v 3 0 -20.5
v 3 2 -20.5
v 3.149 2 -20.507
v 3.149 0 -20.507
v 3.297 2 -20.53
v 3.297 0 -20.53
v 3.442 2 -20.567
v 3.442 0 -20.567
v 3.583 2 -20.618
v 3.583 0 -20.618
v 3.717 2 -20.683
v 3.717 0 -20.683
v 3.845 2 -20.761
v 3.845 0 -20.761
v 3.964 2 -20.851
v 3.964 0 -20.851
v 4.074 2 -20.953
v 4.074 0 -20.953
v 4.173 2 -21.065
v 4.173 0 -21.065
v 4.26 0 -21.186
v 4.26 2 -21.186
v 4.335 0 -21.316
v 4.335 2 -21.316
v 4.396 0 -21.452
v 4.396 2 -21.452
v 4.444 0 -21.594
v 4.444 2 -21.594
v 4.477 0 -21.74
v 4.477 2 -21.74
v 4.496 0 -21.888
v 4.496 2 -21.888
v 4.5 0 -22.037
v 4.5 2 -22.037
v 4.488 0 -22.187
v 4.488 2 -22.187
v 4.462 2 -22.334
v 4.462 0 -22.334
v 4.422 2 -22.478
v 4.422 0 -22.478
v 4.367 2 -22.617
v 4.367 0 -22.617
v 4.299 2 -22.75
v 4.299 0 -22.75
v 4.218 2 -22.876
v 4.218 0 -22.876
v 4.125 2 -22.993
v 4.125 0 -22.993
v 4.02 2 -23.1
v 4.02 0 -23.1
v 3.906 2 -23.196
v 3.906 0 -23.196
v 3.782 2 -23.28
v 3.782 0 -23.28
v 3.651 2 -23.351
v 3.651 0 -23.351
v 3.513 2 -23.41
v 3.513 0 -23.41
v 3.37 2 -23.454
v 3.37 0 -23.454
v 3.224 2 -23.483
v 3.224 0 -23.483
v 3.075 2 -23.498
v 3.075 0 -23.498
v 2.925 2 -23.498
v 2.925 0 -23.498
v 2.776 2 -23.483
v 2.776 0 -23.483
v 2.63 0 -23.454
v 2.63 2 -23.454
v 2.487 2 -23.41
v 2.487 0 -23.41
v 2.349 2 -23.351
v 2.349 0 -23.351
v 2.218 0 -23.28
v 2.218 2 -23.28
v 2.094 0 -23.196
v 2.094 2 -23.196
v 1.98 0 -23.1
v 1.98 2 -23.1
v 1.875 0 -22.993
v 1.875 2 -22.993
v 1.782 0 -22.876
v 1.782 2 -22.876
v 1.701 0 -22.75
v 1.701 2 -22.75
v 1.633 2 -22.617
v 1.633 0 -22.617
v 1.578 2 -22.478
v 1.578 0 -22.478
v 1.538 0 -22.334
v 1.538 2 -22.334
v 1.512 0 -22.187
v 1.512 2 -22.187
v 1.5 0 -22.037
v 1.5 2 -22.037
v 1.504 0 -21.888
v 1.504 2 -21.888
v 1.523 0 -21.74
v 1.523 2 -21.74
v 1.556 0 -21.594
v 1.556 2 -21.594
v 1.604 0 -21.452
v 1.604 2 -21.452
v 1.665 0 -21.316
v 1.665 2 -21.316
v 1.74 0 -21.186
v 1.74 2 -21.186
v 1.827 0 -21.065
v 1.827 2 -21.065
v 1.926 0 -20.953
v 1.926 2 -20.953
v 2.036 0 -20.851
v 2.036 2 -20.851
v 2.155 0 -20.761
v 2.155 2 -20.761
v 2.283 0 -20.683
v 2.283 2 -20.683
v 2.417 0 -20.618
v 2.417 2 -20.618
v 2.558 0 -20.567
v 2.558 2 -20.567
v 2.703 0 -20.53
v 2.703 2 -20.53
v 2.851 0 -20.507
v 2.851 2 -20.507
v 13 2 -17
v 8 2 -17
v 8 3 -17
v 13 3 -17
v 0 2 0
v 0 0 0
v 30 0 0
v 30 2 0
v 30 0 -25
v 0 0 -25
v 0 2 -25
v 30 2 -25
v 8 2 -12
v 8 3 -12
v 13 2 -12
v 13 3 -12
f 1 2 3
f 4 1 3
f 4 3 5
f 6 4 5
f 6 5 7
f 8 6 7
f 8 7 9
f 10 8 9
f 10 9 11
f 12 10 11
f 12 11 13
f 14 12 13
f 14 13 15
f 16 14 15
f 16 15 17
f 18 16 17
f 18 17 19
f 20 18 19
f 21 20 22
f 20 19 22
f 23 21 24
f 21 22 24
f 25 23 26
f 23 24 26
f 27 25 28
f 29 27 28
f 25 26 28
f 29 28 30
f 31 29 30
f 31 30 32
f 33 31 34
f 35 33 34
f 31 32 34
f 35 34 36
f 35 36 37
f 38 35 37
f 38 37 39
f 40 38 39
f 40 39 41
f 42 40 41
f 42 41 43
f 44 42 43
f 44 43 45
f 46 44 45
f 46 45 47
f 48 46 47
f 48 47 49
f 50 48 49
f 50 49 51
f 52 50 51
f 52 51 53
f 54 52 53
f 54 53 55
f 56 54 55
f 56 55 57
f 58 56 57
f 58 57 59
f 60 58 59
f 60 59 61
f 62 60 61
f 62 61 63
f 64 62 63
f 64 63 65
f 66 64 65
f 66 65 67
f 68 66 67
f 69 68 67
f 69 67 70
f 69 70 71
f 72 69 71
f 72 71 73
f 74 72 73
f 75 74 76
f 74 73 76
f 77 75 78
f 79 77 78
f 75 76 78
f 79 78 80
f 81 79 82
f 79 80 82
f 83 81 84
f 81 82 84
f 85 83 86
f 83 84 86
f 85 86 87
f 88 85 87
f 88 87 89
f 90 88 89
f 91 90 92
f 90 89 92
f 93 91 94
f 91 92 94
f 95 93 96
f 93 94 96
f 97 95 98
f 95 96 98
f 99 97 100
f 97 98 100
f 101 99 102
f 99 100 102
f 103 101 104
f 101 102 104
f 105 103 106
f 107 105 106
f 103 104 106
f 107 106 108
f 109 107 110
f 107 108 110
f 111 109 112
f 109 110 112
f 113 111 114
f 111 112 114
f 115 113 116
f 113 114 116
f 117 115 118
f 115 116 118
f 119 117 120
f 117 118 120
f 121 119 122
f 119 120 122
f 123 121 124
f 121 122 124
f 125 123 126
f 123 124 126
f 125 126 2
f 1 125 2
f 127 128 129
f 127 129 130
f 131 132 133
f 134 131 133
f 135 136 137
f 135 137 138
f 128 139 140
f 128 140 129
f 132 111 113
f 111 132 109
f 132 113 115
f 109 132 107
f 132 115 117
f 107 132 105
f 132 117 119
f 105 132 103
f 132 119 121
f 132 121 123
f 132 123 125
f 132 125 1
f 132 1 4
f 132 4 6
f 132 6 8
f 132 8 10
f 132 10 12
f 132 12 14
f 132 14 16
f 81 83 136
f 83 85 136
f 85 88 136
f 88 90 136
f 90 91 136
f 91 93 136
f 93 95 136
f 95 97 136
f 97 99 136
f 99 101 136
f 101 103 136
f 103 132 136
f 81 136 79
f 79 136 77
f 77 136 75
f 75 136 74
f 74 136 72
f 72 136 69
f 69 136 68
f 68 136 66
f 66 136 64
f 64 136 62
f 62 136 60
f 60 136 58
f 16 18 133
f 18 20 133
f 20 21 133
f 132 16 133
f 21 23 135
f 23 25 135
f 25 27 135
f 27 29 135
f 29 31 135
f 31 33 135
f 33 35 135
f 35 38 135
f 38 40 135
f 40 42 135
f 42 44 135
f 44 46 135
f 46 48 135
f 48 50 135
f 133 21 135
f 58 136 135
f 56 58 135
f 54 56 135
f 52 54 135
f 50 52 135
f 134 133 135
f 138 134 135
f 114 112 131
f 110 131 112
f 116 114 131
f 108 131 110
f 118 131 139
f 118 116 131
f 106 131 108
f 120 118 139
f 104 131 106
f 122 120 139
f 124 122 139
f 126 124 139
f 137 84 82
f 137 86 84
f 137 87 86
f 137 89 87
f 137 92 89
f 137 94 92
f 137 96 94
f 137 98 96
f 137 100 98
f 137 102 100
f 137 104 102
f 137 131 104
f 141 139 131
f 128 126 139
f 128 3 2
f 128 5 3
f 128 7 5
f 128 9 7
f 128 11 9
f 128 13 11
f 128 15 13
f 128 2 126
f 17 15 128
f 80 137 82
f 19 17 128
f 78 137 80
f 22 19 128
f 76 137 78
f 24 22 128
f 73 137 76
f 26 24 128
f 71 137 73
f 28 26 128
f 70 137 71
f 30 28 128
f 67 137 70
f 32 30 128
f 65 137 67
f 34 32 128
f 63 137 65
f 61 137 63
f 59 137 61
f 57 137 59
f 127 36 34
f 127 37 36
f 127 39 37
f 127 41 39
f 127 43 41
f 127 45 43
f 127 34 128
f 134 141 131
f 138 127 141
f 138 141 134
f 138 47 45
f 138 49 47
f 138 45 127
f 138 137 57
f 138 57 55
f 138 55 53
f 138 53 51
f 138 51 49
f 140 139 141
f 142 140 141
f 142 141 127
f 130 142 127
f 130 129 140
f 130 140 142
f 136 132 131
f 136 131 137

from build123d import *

# Parameters (mm, degrees)
SKETCH1_W           = 30
SKETCH1_H           = 25
BOSS_EXTRUDE1_DEPTH = 2
SKETCH2_W           = 5
SKETCH2_H           = 5
BOSS_EXTRUDE2_DEPTH = 1
SKETCH3_R           = 1.5
CUT_EXTRUDE1_DEPTH  = 4


with BuildPart() as part:
    # Sketch1 → Boss-Extrude1 (new body)
    with BuildSketch(Plane(origin=(0, 0, 0), x_dir=(1, 0, 0), z_dir=(0, 1, 0))):
        with Locations((15, 12.5)):
            Rectangle(SKETCH1_W, SKETCH1_H)
    extrude(amount=BOSS_EXTRUDE1_DEPTH)

    # Sketch2 → Boss-Extrude2 (add)
    with BuildSketch(Plane(origin=(0, 2, 0), x_dir=(1, 0, 0), z_dir=(0, 1, 0))):
        with Locations((10.5, 14.5)):
            Rectangle(SKETCH2_W, SKETCH2_H)
    extrude(amount=BOSS_EXTRUDE2_DEPTH)

    # Sketch3 → Cut-Extrude1 (cut)
    with BuildSketch(Plane(origin=(0, 2, 0), x_dir=(1, 0, 0), z_dir=(0, 1, 0))):
        with Locations(Location((3, 22, 0), (0, 0, 270))):
            Circle(SKETCH3_R)
    extrude(amount=-CUT_EXTRUDE1_DEPTH, mode=Mode.SUBTRACT)


solid = part.part
